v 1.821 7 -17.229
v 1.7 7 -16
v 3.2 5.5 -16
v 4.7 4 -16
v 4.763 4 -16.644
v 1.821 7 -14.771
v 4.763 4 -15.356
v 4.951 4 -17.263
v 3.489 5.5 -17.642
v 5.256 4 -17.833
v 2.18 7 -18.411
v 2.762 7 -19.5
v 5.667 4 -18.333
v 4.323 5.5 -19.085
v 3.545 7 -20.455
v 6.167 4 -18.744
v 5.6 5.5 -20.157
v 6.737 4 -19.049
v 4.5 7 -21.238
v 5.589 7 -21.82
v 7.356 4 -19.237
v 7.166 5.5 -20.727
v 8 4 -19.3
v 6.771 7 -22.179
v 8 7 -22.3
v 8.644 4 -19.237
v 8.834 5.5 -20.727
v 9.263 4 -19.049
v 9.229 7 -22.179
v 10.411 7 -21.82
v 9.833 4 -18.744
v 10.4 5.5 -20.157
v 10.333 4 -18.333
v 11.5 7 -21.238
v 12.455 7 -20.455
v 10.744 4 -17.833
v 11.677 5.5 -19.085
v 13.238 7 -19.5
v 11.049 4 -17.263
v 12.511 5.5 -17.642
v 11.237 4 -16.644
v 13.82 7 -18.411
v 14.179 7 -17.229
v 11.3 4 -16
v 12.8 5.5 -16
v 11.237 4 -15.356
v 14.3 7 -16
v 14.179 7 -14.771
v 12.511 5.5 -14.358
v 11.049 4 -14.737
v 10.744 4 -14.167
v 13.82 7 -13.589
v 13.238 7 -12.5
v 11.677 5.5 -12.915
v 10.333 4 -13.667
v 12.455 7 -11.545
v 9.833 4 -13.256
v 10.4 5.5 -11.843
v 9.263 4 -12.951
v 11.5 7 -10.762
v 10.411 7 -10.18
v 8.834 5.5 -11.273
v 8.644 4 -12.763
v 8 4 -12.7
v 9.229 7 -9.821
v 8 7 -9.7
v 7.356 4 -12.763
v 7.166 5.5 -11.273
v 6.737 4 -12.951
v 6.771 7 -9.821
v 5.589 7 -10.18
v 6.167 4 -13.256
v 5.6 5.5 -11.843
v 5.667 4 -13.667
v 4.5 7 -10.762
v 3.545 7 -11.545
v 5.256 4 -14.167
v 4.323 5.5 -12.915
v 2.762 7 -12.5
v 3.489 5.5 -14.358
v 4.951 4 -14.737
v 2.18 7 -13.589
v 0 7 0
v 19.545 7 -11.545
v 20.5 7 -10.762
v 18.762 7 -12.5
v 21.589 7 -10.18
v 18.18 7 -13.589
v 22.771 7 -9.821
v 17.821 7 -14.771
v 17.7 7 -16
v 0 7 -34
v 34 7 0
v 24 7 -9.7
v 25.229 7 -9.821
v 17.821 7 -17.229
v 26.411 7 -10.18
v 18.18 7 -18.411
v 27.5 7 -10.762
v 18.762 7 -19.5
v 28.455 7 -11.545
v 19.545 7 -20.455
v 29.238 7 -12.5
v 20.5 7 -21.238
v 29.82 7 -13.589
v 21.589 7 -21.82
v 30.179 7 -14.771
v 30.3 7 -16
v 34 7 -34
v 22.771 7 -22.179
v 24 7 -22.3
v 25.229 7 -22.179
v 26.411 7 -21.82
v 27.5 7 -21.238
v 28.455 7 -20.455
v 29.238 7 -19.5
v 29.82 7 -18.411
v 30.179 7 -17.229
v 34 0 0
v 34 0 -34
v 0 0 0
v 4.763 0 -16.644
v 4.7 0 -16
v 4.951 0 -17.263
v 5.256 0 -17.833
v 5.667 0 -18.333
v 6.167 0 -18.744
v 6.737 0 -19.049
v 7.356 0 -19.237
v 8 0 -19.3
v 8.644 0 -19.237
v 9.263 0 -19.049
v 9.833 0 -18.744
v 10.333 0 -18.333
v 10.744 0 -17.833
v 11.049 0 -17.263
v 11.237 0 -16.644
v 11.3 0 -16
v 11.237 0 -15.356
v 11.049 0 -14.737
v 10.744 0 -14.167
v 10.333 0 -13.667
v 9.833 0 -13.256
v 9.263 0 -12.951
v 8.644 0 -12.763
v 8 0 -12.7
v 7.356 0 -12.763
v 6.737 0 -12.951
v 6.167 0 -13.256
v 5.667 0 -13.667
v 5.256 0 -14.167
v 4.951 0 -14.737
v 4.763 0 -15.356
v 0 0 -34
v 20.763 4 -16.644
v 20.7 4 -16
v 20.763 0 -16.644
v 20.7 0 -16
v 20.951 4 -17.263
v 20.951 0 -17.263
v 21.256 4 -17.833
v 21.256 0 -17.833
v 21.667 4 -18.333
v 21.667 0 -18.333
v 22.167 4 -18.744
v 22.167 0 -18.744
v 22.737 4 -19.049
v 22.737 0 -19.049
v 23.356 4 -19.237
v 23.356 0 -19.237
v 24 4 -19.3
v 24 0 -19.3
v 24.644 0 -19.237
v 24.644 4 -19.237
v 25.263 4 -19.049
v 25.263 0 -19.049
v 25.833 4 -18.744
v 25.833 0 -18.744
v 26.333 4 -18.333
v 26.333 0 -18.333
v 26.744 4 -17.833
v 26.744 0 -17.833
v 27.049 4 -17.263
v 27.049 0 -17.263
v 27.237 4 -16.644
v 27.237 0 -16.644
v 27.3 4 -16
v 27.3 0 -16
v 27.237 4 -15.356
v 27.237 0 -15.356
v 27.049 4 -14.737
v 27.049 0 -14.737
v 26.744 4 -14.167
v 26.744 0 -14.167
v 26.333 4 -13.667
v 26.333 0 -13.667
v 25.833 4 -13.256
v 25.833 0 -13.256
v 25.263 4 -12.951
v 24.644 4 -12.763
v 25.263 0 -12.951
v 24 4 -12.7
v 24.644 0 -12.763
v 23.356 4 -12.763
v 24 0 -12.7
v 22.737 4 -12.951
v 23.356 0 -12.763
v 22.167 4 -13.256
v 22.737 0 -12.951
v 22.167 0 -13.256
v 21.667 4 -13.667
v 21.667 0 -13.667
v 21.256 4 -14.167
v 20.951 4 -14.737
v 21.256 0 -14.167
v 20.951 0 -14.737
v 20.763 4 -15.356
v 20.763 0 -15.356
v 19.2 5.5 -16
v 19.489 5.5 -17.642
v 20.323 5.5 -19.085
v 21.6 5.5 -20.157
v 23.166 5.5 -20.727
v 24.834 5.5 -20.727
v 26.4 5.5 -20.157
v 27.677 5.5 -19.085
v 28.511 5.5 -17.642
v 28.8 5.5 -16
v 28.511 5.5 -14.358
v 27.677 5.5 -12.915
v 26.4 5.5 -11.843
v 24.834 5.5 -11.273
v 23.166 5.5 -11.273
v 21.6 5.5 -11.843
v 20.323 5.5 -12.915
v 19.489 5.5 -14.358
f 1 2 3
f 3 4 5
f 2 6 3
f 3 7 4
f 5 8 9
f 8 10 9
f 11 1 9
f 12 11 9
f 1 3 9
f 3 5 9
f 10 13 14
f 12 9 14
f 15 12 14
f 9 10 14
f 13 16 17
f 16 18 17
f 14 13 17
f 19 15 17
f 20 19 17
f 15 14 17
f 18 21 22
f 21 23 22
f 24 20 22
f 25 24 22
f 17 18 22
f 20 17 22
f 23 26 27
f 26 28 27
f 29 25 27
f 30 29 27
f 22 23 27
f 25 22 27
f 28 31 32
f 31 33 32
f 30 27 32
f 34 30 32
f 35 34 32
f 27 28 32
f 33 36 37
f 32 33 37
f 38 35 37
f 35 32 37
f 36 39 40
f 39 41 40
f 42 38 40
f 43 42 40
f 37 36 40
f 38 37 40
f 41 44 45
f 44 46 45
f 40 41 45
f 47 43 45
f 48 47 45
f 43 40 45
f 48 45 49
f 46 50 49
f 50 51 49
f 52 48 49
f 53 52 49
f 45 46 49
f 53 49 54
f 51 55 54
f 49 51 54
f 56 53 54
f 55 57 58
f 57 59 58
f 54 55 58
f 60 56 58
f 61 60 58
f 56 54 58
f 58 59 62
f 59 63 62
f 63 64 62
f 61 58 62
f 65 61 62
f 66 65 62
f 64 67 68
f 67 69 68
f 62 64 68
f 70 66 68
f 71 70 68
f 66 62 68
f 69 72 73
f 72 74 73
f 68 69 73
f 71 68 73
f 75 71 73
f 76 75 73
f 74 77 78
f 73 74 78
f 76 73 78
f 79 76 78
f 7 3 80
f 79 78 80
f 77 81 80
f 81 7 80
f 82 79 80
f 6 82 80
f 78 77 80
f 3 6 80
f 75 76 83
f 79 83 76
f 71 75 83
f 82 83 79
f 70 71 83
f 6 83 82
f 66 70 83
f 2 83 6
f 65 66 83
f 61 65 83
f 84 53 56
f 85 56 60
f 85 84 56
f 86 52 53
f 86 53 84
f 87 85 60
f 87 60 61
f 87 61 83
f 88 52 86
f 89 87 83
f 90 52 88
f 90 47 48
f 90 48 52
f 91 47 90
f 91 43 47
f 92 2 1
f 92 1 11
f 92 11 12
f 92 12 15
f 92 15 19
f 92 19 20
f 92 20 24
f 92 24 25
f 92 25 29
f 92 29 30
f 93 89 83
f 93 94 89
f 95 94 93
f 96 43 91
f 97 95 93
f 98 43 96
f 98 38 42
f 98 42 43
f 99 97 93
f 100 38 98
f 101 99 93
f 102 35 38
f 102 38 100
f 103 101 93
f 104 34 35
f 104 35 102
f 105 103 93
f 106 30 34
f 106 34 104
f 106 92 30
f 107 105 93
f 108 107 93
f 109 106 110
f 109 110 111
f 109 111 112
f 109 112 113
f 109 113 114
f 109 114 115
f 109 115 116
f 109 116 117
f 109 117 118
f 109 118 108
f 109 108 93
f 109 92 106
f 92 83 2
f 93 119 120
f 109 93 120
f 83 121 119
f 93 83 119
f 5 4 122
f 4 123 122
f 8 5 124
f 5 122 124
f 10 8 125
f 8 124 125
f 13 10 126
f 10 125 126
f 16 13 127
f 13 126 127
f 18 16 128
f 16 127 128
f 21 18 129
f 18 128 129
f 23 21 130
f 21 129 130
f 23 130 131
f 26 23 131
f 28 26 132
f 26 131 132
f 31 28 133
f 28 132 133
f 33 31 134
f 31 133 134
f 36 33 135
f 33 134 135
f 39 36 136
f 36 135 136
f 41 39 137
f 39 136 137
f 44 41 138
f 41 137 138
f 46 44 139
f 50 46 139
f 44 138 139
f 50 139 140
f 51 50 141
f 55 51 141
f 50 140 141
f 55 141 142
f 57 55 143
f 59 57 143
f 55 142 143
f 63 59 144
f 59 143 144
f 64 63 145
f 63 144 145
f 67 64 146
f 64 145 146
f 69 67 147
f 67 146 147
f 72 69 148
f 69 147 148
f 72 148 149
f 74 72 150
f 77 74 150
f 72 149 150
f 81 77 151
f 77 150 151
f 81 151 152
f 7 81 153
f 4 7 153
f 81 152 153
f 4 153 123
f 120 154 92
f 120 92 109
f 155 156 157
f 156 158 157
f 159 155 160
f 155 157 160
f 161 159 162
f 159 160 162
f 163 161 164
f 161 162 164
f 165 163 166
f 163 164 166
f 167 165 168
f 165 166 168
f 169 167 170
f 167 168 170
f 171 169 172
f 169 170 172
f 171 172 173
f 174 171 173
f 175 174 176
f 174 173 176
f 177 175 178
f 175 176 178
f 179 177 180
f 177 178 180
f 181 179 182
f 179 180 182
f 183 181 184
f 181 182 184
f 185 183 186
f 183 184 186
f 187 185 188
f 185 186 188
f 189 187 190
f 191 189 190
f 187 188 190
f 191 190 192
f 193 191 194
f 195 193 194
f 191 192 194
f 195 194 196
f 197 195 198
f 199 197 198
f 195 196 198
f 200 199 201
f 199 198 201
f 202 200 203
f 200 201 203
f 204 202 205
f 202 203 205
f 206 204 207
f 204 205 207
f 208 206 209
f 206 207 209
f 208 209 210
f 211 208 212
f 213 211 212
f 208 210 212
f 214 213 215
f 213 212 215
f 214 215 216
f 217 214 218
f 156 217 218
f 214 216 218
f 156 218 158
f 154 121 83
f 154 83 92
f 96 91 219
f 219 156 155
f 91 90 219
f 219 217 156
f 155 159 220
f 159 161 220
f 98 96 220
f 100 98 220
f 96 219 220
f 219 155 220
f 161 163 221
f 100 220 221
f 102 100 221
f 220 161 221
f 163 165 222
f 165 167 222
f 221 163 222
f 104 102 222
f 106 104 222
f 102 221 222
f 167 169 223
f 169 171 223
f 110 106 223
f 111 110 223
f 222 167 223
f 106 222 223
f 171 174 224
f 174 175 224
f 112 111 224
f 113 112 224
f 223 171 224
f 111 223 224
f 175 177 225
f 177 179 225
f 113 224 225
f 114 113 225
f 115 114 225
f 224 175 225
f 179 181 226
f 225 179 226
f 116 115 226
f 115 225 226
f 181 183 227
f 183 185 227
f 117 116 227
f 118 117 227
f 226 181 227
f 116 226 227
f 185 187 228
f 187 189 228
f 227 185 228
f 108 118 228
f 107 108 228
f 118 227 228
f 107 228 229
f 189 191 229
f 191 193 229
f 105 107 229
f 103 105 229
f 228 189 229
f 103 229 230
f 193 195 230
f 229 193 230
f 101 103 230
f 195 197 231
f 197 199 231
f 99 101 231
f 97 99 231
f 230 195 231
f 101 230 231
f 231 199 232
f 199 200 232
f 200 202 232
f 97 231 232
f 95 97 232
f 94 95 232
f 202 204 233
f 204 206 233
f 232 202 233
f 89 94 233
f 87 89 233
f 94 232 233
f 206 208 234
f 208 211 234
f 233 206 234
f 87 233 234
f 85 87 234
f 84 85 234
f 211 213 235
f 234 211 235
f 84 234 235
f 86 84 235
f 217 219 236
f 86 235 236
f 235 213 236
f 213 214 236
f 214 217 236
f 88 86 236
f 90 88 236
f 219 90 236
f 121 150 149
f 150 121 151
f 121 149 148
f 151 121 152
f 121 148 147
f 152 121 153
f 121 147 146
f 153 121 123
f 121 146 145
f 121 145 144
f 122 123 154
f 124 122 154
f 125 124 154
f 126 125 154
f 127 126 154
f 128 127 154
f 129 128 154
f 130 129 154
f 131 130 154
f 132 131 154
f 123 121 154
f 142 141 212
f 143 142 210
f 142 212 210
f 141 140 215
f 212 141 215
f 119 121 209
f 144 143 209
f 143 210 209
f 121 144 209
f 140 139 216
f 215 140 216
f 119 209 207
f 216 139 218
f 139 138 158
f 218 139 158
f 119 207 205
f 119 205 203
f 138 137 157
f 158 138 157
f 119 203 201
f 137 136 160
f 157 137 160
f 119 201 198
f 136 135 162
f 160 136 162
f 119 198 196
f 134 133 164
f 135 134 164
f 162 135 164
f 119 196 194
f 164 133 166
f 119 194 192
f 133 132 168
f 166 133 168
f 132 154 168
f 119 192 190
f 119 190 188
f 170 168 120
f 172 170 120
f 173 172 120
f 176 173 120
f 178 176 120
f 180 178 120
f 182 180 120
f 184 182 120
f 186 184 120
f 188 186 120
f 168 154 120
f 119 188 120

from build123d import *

# Parameters (mm, degrees)
SKETCH3_W                                       = 34
SKETCH3_H                                       = 34
BOSS_EXTRUDE2_DEPTH                             = 7
CSK_FOR_M6_FLAT_HEAD_MACHINE_SCREW1_D           = 6.6
CSK_FOR_M6_FLAT_HEAD_MACHINE_SCREW1_CSINK_D     = 12.6
CSK_FOR_M6_FLAT_HEAD_MACHINE_SCREW1_CSINK_ANGLE = 90


with BuildPart() as part:
    # Sketch3 → Boss-Extrude2 (new body)
    with BuildSketch(Plane(origin=(0, 0, 0), x_dir=(1, 0, 0), z_dir=(0, 1, 0))):
        with Locations((17, 17)):
            Rectangle(SKETCH3_W, SKETCH3_H)
    extrude(amount=BOSS_EXTRUDE2_DEPTH)

    # CSK for M6 Flat Head Machine Screw1 (through all)
    with Locations(Plane(origin=(0, 7, 0), x_dir=(1, 0, 0), z_dir=(0, 1, 0))):
        with Locations((8, 16), (24, 16)):
            CounterSinkHole(CSK_FOR_M6_FLAT_HEAD_MACHINE_SCREW1_D / 2, CSK_FOR_M6_FLAT_HEAD_MACHINE_SCREW1_CSINK_D / 2, counter_sink_angle=CSK_FOR_M6_FLAT_HEAD_MACHINE_SCREW1_CSINK_ANGLE)


solid = part.part
